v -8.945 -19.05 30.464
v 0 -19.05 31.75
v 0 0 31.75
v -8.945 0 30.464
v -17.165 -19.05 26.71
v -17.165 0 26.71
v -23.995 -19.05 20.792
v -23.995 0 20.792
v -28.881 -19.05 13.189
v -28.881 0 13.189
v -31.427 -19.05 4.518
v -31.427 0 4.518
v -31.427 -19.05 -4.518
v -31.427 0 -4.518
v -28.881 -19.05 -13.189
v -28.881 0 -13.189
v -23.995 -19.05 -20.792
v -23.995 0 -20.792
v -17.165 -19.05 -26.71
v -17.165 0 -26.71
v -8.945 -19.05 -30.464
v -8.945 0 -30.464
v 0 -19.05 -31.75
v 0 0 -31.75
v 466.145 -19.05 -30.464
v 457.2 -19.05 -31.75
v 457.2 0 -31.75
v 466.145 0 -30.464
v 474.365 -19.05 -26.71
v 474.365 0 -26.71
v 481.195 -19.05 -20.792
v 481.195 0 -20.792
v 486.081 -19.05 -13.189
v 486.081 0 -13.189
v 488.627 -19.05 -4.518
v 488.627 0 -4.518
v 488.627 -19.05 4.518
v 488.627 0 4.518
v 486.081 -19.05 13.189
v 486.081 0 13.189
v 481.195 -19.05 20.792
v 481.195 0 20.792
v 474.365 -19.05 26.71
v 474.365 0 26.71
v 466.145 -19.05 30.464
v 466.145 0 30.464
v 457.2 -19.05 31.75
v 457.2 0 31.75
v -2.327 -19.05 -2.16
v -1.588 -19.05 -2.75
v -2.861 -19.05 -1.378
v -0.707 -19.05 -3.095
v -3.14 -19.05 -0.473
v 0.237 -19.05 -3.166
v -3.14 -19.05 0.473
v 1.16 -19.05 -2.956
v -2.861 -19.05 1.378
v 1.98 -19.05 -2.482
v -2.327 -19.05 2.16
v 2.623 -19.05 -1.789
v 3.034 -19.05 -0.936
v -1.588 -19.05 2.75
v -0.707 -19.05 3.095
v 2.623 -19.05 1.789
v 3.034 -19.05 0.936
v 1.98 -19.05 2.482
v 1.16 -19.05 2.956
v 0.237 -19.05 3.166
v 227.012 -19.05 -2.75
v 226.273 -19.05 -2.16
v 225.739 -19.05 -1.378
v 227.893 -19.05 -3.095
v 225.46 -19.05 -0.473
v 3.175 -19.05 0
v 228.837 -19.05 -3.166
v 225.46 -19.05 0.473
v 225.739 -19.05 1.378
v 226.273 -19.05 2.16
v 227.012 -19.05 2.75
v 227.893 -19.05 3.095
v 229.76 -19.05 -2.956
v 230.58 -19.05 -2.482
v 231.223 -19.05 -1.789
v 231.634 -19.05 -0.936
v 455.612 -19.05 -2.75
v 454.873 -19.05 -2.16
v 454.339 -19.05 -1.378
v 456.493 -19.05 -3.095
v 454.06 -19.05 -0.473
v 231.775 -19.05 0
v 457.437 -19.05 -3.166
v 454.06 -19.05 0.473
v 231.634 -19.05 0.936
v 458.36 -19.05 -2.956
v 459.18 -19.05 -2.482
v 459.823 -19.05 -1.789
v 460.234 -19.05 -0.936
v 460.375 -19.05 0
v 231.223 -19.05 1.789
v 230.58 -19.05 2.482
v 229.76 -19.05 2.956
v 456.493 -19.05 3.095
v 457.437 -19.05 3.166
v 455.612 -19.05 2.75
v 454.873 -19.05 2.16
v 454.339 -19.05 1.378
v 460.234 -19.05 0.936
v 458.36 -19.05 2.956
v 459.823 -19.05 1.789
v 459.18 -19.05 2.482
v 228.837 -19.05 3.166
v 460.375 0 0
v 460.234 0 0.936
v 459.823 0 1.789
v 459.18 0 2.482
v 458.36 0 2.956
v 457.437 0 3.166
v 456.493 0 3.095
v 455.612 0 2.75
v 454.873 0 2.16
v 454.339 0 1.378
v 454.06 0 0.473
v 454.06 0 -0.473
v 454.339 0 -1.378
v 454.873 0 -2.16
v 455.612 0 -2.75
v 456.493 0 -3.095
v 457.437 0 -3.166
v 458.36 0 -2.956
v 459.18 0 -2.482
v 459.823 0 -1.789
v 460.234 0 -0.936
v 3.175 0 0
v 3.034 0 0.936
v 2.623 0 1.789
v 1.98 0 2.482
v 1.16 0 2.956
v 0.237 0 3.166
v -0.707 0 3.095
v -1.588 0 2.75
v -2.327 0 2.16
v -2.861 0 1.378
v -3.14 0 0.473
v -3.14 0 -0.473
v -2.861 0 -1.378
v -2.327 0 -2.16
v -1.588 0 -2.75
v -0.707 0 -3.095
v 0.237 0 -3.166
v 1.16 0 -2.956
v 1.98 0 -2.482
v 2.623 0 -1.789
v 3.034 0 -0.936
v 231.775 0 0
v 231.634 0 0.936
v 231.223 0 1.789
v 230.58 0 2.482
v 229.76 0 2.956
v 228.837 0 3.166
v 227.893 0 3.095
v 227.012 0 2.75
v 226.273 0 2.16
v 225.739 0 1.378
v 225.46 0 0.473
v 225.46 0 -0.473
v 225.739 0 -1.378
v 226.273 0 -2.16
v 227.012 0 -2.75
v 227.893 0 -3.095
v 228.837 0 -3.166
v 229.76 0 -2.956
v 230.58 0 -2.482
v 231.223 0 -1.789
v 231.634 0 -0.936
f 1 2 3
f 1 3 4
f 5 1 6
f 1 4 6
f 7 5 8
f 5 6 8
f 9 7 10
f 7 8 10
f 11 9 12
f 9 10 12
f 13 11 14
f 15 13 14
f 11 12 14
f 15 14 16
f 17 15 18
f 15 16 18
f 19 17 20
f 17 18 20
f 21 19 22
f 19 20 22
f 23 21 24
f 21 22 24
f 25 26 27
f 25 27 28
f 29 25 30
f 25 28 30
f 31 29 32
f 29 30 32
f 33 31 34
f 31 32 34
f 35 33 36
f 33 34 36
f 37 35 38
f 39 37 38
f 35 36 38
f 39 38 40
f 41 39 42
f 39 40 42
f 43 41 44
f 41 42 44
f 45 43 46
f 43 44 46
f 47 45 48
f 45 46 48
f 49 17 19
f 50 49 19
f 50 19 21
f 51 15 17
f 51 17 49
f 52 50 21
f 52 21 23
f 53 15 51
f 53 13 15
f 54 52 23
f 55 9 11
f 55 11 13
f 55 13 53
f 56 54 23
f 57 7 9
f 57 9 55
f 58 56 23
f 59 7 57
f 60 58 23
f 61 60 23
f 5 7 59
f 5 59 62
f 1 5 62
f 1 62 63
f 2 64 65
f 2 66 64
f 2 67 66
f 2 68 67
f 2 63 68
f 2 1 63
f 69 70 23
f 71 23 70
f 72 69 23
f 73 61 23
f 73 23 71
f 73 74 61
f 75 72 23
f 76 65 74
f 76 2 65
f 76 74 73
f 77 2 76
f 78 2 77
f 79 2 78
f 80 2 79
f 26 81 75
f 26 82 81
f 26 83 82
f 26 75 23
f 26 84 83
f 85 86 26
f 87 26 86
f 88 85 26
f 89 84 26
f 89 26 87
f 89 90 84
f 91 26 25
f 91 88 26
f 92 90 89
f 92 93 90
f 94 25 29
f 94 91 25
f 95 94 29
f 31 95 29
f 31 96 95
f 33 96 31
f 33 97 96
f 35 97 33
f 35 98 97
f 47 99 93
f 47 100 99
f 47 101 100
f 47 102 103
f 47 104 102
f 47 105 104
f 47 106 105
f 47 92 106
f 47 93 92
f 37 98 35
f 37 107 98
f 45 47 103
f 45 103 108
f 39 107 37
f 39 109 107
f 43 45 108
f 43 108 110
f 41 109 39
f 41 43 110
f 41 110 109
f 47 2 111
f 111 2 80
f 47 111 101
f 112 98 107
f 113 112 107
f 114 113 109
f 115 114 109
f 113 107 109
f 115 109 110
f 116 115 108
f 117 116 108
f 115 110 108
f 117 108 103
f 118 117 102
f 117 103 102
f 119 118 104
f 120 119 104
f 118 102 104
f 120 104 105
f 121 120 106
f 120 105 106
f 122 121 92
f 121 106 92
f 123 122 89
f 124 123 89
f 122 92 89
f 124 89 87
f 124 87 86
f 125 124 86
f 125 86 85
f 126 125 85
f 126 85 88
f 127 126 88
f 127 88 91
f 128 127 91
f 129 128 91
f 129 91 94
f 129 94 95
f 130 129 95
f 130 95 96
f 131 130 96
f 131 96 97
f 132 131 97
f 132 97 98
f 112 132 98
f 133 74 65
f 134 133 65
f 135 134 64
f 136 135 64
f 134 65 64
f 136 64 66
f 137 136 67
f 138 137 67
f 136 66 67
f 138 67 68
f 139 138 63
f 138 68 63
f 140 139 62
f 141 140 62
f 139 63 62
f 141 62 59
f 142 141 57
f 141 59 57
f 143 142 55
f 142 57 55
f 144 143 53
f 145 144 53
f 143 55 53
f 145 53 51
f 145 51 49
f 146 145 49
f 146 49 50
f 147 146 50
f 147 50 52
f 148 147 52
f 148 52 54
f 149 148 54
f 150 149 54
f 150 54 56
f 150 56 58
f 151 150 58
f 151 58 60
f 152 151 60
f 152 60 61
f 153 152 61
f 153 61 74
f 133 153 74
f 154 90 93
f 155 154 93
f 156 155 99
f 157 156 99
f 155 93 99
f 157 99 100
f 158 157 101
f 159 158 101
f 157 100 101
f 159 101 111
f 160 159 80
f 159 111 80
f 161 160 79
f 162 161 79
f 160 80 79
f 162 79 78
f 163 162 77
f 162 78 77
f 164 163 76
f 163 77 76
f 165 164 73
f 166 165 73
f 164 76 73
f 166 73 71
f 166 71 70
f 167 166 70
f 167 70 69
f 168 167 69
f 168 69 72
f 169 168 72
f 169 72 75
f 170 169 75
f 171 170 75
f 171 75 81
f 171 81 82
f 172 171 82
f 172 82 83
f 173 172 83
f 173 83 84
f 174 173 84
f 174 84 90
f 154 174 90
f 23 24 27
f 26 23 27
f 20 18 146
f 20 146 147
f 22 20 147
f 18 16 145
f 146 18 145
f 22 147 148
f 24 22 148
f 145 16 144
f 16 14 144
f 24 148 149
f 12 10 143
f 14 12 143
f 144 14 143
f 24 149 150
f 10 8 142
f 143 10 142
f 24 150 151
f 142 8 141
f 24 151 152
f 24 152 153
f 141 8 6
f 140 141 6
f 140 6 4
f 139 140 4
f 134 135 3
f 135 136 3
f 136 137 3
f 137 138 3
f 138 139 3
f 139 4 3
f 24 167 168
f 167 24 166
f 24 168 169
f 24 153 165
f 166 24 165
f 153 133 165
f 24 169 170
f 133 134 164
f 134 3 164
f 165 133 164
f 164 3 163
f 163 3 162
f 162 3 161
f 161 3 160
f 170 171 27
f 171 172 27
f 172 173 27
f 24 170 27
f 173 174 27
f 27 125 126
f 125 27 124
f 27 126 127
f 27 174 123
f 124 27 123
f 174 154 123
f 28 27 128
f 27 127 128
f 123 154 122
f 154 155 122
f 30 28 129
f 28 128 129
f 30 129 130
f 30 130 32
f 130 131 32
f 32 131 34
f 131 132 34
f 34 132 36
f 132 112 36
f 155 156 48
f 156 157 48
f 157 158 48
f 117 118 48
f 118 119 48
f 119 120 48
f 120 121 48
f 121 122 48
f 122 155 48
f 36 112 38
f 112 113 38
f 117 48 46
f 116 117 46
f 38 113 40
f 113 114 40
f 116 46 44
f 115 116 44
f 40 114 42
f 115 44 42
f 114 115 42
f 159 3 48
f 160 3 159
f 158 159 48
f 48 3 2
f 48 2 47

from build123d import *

# Parameters (mm, degrees)
F0_W     = 457.2
F0_H     = 63.5
F1_DEPTH = 19.05
F3_D     = 6.35


with BuildPart() as f1:
    # F0 (on Front) → F1 (new body)
    with BuildSketch(Plane.XZ):
        with Locations((228.6, 0)):
            Rectangle(F0_W, F0_H)
        with BuildLine():
            ThreePointArc((0, 31.75), (-31.75, 0), (0, -31.75))
            Line((0, -31.75), (0, 31.75))
        make_face()
        with BuildLine():
            Line((457.2, 31.75), (457.2, -31.75))
            ThreePointArc((457.2, -31.75), (488.95, 0), (457.2, 31.75))
        make_face()
    extrude(amount=F1_DEPTH)

    # F3 (through all)
    with Locations(Plane(origin=(0, 0, 0), x_dir=(-1, 0, 0), z_dir=(0, 1, 0))):
        with Locations((-457.2, 0), (0, 0), (-228.6, 0)):
            Hole(F3_D / 2)


solid = f1.part
